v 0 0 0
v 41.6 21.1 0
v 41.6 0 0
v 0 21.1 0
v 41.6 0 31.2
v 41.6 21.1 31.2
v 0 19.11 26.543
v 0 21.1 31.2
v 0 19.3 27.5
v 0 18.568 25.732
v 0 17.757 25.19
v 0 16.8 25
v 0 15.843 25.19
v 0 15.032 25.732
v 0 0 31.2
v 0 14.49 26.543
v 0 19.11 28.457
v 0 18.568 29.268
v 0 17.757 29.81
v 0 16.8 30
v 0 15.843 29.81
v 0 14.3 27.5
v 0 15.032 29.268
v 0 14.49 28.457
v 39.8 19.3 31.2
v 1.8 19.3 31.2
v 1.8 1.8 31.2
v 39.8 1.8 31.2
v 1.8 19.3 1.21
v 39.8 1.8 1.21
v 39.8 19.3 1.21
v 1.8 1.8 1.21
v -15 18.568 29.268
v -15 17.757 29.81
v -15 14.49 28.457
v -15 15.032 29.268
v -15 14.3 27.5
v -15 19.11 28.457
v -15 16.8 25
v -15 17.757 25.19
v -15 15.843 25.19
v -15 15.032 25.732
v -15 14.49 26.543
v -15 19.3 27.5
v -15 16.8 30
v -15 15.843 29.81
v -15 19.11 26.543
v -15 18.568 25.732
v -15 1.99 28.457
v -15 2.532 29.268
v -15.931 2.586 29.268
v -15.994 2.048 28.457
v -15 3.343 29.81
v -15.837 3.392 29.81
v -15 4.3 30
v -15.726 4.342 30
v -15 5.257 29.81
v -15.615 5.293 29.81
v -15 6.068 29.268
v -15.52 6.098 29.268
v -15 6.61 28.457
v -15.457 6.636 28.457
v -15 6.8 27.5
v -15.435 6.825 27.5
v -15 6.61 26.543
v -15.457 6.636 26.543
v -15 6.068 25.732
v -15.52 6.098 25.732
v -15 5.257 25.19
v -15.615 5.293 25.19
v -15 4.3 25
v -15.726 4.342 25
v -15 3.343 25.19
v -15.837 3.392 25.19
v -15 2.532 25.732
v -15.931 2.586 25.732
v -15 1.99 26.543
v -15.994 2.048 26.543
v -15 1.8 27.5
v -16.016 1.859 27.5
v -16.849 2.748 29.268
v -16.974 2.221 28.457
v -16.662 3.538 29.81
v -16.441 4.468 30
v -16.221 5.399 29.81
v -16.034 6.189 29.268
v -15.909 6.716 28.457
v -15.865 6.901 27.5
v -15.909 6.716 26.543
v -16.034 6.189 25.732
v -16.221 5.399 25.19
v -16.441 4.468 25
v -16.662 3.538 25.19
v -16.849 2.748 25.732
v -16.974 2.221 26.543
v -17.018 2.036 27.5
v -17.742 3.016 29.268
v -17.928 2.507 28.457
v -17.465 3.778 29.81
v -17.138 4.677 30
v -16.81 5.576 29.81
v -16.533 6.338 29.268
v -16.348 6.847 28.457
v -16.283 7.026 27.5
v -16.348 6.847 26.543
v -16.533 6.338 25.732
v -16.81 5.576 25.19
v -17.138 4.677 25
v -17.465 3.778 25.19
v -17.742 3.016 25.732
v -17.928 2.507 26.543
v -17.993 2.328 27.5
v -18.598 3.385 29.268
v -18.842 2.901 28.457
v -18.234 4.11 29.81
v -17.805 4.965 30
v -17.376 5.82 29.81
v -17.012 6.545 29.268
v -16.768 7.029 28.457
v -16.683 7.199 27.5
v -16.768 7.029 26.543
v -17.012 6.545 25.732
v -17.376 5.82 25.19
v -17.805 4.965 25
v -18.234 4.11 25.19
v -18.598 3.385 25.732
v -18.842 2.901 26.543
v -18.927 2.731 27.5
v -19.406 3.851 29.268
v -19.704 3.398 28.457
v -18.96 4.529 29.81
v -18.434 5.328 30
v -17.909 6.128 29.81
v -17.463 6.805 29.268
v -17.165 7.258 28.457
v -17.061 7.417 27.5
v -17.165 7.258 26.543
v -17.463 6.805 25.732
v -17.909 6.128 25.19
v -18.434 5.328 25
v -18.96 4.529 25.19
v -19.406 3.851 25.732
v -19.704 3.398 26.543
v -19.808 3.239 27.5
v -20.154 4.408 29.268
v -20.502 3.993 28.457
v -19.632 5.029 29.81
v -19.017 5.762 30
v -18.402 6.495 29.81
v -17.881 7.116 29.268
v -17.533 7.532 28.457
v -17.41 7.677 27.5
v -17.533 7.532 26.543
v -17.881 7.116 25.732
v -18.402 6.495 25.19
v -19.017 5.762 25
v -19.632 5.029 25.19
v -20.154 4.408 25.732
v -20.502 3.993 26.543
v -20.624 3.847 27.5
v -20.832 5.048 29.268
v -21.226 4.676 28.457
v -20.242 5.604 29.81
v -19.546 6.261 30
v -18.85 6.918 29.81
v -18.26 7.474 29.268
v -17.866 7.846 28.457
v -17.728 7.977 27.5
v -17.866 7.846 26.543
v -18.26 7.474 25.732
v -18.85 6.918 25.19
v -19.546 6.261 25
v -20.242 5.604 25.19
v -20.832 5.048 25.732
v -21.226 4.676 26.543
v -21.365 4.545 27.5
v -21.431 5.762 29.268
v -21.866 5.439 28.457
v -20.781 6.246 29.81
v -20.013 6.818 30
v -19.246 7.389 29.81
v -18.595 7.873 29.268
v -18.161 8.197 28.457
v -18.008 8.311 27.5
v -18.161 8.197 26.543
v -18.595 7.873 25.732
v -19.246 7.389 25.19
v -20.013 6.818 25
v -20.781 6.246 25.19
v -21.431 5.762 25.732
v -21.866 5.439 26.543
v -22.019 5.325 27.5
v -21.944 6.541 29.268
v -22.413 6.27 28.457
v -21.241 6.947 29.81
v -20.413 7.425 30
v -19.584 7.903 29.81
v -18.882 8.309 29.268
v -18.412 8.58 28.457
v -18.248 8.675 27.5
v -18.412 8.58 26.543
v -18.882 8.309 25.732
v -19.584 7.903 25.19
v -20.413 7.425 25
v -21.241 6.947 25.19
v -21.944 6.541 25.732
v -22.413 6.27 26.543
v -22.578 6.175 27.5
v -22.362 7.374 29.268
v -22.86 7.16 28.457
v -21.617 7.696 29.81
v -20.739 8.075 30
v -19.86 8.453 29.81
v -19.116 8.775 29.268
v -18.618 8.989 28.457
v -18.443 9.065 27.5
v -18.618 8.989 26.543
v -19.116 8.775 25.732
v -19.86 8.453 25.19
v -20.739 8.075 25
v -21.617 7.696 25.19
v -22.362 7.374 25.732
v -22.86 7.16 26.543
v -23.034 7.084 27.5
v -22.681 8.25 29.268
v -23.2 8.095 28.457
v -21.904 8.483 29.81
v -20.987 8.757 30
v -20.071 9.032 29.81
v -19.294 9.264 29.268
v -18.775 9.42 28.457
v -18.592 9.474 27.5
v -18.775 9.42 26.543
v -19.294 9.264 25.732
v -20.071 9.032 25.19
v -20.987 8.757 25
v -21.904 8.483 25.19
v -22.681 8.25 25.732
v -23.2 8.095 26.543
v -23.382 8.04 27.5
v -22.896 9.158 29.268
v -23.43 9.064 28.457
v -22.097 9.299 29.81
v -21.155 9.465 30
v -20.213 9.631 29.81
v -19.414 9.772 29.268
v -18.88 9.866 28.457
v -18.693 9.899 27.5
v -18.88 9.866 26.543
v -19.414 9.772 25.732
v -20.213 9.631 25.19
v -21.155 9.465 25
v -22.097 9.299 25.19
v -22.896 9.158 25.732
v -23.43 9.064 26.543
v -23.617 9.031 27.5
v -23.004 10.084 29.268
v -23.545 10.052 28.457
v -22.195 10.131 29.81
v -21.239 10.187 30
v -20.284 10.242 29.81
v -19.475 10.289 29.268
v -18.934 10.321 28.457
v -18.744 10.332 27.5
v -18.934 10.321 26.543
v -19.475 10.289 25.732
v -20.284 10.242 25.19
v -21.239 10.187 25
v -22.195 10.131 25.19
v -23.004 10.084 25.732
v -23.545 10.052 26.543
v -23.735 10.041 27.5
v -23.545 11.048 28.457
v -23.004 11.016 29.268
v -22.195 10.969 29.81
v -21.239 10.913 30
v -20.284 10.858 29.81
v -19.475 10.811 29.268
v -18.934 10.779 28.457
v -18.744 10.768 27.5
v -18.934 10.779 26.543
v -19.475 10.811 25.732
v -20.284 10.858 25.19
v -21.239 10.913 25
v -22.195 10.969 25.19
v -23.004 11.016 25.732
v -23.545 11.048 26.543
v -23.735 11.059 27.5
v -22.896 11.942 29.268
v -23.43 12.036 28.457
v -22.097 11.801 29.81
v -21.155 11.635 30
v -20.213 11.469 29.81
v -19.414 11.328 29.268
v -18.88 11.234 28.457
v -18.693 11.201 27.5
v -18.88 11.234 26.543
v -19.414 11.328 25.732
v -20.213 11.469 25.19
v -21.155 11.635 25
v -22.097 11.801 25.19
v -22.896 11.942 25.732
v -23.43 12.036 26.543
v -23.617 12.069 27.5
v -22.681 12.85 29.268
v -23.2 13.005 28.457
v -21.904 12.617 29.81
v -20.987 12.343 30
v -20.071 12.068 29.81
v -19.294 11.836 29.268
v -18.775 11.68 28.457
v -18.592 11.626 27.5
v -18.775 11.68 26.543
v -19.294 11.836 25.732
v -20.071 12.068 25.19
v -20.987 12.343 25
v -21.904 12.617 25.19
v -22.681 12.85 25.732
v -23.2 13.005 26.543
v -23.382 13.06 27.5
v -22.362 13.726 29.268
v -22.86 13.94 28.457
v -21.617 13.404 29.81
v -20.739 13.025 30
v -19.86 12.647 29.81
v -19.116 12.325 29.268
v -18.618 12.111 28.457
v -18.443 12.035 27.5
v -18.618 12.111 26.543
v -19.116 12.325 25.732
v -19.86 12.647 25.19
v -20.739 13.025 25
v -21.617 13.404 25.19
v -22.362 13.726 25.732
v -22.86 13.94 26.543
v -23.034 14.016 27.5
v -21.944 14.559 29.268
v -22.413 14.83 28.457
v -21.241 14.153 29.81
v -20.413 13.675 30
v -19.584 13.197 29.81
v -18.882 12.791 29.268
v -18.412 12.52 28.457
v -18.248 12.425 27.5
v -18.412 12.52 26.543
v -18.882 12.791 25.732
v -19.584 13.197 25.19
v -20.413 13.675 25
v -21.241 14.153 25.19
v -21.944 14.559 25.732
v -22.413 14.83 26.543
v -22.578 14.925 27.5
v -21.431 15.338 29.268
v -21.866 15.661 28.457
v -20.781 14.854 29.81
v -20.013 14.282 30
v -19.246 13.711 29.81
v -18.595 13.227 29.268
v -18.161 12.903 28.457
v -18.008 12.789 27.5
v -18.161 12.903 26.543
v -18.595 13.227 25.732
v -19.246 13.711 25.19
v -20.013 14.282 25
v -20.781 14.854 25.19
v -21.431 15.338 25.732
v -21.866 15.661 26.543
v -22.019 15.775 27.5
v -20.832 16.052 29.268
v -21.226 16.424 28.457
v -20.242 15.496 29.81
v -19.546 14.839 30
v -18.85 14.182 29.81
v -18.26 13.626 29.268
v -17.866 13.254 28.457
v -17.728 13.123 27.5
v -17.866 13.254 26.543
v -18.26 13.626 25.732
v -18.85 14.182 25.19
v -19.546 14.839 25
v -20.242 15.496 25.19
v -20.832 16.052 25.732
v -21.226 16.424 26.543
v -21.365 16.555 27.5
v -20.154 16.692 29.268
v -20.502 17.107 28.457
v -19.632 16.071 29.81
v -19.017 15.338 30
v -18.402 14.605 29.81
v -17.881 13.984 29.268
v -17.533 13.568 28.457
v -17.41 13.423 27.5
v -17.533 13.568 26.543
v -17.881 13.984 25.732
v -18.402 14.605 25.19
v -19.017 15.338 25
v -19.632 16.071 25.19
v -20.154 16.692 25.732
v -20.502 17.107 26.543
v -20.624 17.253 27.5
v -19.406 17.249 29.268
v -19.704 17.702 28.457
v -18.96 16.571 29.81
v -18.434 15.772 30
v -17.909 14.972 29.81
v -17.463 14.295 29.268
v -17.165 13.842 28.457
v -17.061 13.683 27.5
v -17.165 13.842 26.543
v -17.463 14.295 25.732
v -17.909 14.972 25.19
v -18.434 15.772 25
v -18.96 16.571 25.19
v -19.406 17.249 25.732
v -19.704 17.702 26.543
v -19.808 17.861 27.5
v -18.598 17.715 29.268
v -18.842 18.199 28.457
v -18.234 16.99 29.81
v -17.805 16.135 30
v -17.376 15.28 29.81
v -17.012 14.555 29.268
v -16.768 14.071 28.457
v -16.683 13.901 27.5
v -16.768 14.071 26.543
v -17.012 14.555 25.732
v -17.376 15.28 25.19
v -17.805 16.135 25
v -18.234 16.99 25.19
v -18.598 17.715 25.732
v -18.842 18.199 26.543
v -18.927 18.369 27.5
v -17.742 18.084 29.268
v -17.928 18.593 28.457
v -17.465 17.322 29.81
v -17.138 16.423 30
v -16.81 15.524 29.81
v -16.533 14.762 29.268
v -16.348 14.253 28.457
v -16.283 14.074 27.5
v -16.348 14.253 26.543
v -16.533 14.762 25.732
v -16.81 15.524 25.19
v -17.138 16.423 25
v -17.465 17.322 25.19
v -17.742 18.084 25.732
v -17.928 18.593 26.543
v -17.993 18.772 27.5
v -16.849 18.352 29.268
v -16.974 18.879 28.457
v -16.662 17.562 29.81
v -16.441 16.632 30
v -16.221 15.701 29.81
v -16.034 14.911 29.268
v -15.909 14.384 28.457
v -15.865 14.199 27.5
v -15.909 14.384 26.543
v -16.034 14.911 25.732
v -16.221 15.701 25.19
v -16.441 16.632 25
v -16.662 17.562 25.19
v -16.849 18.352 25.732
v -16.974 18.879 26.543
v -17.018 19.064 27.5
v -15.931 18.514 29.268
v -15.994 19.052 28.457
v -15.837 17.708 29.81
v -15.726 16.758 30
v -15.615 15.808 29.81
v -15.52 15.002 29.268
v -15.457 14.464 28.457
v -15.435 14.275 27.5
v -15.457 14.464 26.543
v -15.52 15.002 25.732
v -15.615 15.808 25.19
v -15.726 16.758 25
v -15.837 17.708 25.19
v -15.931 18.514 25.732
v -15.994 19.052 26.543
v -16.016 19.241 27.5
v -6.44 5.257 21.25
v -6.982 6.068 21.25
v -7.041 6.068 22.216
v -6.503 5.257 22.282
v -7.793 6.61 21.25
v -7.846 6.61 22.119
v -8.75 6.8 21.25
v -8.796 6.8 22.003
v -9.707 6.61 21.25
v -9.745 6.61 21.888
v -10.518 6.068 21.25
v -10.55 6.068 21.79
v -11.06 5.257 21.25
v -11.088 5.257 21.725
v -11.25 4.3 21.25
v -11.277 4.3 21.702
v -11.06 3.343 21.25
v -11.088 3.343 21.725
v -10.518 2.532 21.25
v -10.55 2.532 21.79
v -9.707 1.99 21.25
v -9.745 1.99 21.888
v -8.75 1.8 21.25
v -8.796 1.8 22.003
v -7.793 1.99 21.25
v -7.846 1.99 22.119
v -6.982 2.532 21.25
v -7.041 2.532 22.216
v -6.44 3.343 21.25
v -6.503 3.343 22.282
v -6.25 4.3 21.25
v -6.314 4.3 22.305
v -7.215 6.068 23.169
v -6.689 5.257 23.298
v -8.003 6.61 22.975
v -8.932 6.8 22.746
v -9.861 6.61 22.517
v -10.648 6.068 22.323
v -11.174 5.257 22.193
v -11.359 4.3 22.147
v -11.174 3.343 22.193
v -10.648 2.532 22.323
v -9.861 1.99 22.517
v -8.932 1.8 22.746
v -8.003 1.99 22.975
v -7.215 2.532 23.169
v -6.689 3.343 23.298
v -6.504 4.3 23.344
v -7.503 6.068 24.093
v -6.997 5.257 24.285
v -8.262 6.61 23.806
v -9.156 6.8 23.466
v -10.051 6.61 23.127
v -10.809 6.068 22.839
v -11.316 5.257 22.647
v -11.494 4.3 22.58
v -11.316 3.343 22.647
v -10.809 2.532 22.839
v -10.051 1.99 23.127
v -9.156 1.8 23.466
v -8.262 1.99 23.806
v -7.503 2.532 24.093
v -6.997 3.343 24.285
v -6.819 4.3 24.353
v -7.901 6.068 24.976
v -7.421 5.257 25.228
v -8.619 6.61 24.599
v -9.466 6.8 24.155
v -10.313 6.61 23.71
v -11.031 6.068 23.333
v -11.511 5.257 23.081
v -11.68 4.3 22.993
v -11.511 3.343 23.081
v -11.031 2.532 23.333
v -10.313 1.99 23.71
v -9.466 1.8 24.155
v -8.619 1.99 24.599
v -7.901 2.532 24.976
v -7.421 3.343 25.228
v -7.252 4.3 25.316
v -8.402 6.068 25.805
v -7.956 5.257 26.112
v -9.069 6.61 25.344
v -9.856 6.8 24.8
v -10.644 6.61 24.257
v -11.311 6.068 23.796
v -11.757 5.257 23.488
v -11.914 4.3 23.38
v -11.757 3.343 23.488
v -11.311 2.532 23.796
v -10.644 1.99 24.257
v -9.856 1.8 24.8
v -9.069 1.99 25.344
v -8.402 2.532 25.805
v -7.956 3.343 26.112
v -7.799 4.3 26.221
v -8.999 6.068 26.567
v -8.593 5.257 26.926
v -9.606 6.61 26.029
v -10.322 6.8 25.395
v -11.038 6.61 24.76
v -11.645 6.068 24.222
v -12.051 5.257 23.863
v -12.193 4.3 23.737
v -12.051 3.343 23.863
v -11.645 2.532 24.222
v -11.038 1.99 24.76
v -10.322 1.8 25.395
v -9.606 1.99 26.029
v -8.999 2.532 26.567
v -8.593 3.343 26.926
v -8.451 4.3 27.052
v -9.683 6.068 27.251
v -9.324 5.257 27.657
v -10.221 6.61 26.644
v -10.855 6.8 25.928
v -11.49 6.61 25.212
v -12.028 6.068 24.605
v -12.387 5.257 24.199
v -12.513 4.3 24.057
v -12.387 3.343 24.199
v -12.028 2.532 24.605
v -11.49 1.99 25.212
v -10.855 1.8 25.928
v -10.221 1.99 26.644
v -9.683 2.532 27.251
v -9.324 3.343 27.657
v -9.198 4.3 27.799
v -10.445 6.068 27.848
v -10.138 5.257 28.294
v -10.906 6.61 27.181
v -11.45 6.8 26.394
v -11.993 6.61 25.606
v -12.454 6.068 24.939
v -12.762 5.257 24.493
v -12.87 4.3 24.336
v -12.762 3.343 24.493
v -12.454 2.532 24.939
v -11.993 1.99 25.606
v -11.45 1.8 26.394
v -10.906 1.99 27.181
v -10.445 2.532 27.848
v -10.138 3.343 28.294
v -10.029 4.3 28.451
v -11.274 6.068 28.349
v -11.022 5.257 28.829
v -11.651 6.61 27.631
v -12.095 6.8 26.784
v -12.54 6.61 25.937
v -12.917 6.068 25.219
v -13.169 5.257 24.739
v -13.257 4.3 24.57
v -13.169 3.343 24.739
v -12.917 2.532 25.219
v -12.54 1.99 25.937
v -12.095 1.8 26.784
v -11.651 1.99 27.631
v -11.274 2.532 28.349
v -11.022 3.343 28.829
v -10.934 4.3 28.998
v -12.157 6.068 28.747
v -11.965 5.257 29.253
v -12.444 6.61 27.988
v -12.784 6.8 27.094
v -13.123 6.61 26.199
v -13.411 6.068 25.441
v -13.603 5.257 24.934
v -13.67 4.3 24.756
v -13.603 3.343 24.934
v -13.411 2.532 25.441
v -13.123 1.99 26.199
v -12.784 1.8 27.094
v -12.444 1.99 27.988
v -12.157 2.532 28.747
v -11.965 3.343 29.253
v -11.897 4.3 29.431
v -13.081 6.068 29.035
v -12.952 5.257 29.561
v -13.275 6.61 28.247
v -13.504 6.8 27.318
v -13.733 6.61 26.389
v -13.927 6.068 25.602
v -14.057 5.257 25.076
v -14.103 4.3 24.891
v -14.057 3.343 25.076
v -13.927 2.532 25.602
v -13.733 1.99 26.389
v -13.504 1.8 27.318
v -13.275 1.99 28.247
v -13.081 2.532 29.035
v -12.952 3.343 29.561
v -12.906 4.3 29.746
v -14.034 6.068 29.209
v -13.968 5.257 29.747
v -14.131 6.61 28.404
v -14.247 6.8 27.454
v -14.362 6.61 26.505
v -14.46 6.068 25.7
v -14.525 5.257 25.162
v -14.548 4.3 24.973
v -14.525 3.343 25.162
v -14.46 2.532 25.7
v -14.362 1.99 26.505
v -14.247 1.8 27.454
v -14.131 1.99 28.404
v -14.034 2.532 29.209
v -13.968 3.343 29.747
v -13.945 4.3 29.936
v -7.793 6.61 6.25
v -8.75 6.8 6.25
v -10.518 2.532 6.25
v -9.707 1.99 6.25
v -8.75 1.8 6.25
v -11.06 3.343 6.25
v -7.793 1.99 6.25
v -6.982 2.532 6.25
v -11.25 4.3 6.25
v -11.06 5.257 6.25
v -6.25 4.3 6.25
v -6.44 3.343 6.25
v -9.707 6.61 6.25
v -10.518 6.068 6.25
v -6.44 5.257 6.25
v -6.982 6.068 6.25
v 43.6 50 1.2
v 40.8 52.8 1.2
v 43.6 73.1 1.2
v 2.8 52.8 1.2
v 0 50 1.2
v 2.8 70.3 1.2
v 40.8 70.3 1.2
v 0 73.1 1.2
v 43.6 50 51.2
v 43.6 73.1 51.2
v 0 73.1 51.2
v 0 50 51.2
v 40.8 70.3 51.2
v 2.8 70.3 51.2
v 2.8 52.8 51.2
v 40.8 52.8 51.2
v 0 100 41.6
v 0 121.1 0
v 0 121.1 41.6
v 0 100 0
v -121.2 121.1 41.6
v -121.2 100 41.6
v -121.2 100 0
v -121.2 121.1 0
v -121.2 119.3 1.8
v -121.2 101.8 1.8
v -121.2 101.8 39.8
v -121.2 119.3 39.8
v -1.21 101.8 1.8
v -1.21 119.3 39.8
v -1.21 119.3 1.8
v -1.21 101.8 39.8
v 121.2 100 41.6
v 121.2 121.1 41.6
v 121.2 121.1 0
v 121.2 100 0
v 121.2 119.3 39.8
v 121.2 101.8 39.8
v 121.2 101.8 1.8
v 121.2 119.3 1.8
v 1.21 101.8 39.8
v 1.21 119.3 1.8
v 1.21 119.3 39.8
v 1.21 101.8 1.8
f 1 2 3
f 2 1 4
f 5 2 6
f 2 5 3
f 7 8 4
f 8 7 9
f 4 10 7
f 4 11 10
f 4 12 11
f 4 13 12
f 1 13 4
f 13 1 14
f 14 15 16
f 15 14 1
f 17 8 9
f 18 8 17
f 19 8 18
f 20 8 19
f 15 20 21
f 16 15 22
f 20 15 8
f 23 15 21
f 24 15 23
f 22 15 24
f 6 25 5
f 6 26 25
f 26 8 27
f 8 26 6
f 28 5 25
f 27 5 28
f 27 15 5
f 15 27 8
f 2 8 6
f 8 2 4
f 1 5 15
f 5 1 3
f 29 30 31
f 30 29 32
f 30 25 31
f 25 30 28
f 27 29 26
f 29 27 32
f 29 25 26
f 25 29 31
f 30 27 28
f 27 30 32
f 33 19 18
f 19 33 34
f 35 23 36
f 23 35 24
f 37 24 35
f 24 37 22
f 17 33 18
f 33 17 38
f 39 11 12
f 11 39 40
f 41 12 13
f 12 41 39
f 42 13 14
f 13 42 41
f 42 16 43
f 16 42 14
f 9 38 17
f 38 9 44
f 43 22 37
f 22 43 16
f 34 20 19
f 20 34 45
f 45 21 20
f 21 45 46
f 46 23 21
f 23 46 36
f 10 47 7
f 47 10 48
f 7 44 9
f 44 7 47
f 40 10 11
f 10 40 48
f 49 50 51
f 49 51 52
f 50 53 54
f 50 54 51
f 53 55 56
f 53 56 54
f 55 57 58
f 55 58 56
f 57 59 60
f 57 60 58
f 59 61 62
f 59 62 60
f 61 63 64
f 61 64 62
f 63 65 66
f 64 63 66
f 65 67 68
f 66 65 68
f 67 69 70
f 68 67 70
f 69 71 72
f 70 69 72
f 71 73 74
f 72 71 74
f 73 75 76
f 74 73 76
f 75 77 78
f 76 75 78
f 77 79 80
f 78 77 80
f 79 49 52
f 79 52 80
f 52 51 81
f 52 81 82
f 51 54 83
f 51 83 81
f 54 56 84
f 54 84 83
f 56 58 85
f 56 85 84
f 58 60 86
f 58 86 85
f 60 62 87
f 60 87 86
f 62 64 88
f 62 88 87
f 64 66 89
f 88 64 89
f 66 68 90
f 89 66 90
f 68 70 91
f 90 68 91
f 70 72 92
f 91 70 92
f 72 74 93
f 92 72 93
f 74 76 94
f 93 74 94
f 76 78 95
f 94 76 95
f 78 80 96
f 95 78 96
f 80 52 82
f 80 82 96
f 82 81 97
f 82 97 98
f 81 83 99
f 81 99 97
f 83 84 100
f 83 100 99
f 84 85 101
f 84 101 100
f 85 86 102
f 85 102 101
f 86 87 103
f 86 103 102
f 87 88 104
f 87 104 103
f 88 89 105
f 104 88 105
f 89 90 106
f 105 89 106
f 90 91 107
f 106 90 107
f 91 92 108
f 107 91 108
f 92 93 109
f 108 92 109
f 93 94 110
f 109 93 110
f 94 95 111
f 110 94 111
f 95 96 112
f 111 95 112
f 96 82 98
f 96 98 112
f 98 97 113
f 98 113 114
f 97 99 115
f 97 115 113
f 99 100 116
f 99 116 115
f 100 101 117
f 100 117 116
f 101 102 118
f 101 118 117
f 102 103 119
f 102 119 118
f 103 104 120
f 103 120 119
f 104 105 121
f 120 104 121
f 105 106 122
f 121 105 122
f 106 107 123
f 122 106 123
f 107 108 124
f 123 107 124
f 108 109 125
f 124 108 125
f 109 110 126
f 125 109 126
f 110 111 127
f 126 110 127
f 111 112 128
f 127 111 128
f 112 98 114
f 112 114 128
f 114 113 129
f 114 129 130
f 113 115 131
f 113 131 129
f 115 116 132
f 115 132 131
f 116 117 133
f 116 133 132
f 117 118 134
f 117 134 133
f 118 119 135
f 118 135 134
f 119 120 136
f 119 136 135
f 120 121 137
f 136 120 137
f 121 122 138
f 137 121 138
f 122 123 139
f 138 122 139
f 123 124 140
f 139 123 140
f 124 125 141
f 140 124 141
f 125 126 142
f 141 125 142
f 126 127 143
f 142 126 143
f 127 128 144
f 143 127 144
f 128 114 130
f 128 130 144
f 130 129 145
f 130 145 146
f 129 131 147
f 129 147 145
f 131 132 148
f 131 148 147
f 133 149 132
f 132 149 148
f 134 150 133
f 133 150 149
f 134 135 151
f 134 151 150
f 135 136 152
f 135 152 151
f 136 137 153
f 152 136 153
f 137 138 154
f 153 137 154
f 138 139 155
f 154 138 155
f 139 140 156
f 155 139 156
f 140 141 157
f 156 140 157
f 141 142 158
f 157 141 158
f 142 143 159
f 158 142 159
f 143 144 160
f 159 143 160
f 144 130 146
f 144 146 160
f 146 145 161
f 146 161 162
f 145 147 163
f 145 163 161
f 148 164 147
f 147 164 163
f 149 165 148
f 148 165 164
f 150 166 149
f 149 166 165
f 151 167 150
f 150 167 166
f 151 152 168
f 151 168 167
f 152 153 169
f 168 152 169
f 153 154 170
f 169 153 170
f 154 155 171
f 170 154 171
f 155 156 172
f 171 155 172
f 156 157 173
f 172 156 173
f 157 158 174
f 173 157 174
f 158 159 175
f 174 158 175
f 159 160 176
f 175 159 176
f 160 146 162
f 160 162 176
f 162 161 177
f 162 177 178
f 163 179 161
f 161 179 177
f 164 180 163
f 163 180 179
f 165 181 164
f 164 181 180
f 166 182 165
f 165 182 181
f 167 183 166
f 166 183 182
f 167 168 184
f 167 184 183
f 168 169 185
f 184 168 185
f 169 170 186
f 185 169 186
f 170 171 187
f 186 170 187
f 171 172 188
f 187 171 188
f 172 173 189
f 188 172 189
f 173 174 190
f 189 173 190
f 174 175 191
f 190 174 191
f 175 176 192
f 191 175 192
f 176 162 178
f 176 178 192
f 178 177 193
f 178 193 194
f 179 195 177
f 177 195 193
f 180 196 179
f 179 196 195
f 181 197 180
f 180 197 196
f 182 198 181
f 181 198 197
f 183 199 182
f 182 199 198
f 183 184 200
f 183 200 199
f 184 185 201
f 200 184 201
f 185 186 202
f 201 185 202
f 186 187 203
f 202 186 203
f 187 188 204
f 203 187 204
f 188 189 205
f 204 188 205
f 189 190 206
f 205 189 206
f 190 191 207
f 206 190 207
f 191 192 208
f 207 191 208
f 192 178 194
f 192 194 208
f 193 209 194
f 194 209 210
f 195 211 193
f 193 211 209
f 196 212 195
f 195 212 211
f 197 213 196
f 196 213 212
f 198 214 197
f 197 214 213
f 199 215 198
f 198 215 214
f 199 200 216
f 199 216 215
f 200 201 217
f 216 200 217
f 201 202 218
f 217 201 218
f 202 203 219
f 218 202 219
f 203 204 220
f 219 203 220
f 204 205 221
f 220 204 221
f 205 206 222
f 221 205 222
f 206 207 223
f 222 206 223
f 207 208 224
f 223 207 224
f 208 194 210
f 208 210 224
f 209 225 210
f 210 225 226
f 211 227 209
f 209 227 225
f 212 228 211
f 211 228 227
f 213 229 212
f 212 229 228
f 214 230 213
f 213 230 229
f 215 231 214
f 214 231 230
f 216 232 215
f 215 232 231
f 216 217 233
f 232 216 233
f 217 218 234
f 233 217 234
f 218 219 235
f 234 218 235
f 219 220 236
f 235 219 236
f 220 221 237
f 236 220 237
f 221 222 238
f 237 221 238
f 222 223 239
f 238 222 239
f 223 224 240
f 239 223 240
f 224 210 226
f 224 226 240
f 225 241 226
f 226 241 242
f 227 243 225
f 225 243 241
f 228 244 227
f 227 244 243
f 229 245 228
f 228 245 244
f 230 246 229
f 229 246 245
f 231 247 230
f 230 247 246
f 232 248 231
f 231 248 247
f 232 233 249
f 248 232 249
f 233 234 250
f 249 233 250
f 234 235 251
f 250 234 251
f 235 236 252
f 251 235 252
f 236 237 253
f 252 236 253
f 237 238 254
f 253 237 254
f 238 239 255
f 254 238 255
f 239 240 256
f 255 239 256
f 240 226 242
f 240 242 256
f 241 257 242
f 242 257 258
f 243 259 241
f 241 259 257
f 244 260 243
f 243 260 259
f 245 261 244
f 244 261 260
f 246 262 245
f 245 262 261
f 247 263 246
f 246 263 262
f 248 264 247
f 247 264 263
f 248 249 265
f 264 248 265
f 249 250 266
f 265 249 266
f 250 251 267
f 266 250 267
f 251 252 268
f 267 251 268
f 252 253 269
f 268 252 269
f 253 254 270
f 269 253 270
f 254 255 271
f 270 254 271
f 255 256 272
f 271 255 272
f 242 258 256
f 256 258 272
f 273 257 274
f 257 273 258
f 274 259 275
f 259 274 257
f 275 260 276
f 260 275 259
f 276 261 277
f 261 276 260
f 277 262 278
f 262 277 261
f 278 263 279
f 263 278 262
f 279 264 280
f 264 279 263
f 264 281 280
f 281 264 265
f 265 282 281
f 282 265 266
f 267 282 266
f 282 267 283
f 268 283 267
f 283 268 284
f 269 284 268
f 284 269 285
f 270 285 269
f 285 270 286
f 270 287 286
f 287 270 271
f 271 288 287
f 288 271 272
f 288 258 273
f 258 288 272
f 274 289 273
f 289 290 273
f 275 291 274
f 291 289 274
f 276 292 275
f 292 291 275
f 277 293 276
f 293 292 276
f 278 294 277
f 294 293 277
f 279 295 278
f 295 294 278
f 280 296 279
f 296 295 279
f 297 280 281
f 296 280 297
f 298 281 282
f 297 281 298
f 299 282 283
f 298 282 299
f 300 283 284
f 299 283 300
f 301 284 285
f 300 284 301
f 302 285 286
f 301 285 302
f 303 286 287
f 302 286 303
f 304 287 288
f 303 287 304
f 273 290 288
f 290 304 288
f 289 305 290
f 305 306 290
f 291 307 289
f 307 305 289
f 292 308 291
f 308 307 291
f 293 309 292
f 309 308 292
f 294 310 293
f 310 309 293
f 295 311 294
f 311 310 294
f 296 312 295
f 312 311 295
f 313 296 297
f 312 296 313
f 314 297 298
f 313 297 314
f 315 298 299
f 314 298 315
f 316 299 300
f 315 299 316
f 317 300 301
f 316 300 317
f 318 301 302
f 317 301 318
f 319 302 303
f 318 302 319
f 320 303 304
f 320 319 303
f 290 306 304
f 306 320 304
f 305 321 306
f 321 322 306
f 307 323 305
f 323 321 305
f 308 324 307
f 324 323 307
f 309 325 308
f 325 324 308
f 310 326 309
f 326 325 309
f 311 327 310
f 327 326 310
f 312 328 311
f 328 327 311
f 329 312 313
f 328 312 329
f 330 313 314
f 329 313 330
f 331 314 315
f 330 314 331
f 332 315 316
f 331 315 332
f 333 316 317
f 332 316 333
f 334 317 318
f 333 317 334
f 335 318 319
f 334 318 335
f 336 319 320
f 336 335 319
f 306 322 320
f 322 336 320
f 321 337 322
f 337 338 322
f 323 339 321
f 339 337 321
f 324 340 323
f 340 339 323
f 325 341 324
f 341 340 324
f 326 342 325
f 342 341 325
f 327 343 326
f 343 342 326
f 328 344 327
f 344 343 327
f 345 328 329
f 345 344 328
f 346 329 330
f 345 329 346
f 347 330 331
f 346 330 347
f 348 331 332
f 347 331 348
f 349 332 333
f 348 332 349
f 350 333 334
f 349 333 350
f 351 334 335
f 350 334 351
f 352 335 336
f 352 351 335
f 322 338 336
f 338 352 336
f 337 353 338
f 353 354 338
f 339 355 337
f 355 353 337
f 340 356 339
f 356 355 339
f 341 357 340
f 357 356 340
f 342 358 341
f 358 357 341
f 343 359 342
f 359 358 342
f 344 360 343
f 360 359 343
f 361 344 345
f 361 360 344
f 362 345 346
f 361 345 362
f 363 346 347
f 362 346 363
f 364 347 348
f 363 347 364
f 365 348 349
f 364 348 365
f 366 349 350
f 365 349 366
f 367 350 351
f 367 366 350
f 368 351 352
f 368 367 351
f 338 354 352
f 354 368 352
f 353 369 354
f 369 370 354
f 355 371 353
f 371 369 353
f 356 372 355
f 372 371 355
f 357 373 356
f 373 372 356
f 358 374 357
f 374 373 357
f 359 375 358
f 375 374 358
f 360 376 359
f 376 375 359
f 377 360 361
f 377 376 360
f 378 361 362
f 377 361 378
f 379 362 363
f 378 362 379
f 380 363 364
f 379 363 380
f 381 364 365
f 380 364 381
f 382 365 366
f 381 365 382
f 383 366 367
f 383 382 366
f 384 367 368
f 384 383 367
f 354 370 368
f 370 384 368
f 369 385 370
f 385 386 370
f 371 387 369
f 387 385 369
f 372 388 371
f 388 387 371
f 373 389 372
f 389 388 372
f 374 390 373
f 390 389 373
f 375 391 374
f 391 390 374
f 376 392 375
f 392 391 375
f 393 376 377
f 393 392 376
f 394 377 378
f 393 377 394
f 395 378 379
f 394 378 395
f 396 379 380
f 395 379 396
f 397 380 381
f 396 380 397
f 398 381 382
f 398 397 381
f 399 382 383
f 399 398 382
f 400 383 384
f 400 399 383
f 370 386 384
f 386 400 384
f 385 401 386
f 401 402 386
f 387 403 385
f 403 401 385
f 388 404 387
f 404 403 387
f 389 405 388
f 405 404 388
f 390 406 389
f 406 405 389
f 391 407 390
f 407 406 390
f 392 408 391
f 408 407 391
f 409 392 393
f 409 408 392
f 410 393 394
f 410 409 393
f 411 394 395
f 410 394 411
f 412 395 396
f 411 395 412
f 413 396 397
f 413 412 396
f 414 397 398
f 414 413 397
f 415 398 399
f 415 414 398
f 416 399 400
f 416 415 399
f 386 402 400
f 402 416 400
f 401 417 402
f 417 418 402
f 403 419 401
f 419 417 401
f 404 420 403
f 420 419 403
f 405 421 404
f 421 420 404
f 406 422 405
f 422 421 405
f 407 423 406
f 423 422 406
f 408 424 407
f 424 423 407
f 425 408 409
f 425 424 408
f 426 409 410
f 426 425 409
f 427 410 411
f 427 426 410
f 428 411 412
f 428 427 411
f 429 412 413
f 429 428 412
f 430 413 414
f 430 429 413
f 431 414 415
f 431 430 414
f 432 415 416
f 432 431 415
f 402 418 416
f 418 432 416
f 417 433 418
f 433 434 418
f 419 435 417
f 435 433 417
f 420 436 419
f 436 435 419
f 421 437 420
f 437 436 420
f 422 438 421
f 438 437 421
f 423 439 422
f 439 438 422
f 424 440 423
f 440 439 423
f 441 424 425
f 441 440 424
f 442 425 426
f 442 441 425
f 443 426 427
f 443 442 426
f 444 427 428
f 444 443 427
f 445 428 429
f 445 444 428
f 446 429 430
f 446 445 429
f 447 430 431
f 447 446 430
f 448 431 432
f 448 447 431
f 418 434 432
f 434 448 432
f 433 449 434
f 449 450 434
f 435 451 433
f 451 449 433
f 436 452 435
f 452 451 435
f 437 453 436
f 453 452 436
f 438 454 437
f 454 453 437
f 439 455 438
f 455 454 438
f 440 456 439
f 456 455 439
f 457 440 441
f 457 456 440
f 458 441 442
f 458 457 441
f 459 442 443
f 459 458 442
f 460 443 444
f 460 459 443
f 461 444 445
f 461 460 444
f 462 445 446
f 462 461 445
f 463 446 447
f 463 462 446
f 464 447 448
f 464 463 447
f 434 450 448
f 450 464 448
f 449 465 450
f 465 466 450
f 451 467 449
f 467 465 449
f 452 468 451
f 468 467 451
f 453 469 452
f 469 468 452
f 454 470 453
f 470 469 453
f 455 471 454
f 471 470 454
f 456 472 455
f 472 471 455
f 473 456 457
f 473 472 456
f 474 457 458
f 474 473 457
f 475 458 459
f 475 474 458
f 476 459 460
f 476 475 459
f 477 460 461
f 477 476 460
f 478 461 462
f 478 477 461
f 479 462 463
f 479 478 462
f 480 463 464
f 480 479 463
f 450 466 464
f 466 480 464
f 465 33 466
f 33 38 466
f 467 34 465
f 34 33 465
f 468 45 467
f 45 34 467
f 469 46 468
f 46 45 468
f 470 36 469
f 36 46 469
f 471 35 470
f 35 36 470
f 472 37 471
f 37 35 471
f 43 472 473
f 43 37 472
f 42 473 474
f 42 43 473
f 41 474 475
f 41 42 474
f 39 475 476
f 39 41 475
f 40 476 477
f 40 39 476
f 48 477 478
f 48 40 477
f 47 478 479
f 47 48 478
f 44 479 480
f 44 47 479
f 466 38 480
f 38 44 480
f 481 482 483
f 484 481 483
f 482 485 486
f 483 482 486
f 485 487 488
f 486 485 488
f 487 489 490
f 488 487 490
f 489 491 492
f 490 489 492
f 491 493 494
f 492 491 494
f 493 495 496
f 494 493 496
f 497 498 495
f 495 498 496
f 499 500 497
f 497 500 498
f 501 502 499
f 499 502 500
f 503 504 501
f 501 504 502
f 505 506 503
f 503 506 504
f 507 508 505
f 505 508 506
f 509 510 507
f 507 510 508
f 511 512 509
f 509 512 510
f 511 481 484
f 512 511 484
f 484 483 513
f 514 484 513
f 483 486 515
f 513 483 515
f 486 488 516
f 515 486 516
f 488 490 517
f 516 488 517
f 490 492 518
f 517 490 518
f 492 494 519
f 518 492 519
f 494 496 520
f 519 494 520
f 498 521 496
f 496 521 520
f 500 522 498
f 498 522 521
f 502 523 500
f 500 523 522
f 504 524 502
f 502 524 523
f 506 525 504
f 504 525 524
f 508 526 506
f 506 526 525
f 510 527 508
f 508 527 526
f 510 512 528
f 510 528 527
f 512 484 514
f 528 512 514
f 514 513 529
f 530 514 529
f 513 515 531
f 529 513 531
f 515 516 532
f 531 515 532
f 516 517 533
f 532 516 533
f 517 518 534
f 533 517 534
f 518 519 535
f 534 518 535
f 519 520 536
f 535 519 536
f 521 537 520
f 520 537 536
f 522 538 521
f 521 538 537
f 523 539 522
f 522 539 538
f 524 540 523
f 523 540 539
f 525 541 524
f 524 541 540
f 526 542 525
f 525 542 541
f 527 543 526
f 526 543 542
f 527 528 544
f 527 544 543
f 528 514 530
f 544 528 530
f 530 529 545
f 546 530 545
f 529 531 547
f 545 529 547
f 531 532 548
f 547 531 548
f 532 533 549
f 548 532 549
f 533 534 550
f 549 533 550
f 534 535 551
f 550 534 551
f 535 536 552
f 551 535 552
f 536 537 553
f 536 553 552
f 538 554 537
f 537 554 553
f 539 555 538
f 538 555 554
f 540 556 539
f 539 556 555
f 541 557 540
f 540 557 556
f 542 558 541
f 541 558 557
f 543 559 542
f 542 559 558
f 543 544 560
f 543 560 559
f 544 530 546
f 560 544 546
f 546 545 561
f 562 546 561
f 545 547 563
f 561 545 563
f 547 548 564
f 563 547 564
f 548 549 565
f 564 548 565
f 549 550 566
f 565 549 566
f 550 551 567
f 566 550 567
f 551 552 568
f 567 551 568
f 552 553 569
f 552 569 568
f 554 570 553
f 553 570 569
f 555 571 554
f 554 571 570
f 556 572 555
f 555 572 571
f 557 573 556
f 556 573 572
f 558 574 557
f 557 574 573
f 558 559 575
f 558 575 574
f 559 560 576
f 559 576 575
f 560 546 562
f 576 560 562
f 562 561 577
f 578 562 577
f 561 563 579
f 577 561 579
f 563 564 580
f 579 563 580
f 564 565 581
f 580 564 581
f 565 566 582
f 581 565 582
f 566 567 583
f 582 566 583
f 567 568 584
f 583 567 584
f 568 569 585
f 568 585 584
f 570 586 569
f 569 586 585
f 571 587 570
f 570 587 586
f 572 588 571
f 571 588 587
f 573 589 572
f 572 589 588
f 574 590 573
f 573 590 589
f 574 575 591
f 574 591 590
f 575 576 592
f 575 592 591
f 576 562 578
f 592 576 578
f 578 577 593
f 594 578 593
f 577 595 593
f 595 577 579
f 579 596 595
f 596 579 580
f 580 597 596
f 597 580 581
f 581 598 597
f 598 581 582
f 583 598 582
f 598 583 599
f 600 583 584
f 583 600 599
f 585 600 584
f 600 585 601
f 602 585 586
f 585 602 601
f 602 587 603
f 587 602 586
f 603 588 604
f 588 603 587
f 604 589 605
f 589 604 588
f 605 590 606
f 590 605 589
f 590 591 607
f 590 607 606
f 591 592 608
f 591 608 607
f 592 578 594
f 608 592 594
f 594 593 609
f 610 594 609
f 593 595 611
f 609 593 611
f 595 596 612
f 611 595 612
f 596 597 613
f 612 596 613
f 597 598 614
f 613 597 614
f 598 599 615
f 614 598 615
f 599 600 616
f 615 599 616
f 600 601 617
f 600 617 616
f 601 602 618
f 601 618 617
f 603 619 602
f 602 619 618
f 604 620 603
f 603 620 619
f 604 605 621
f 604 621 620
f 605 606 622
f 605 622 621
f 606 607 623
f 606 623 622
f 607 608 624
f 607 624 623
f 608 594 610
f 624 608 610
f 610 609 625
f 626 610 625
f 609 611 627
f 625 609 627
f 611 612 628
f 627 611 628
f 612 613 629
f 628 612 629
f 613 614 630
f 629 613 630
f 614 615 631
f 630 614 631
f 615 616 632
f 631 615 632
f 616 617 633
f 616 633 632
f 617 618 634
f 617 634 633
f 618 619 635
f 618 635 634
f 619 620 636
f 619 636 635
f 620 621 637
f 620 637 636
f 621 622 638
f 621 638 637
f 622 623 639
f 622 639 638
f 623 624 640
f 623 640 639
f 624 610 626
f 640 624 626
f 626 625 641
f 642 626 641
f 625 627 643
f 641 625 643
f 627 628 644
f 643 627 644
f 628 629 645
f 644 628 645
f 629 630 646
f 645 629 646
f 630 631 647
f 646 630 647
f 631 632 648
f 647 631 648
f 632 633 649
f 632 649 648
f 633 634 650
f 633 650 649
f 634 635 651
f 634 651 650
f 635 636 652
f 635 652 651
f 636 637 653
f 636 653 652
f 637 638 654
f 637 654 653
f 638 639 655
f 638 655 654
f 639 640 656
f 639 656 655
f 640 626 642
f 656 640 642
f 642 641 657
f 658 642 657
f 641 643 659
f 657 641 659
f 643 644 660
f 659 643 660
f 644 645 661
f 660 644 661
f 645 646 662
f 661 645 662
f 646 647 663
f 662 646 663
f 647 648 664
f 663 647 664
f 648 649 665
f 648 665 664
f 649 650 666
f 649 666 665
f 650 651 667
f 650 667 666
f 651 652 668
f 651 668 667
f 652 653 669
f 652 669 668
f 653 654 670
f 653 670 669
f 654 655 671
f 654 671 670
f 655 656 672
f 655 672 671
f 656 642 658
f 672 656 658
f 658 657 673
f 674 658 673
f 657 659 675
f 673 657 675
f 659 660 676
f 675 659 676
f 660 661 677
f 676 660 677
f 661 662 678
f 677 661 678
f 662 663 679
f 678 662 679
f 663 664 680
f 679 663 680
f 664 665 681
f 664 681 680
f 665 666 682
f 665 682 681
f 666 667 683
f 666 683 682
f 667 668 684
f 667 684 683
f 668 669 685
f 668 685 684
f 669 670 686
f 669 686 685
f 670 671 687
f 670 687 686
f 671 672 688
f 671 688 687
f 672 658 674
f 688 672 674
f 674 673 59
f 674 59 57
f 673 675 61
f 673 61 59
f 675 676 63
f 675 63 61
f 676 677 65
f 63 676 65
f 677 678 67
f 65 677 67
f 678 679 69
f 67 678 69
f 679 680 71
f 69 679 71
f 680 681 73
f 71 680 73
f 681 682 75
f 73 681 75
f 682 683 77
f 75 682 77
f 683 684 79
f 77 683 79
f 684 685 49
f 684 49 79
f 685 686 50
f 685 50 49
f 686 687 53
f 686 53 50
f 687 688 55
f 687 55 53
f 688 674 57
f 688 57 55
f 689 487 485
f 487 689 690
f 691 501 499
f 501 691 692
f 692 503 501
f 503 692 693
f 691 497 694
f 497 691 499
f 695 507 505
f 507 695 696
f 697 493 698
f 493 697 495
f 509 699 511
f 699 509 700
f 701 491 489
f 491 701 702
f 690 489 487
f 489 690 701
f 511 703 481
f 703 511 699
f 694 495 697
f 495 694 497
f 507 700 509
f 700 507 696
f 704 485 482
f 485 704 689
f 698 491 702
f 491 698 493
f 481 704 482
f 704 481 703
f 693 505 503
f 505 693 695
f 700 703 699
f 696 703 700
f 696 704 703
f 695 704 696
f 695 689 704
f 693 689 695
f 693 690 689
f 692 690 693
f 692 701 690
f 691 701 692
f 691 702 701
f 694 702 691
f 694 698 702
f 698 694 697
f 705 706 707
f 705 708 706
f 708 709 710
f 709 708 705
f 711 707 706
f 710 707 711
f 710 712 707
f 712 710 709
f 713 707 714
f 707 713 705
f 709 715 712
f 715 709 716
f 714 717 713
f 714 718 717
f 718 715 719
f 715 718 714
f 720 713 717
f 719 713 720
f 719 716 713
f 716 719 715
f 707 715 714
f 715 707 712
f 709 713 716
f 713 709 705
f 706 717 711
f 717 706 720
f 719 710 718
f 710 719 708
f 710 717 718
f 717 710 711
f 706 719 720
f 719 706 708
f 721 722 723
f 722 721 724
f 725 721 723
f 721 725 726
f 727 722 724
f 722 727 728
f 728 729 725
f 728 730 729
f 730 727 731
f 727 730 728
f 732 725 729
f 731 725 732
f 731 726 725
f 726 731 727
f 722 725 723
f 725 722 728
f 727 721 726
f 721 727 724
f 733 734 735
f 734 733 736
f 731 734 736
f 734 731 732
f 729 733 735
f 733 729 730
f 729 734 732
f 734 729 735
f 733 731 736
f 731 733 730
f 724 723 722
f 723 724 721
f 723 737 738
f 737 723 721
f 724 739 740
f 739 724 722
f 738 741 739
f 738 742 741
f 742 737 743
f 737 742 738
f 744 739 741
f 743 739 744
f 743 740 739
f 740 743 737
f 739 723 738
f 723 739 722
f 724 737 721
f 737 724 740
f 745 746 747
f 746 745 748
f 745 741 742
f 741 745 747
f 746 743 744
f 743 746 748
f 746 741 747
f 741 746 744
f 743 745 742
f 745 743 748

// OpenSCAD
// -*- mode: SCAD ; c-file-style: "ellemtel" ; coding: utf-8 -*-
//
// NN
//
// © 2018–2019 Roland Sieker <ospalh@gmail.com>
// Licence: CC-BY-SA 4.0

/* [Global] */

// … to preview. You will get all parts as separate STLs when you click “Create Thing”.
part = "s"; // [s: Set, h: Haken, d: Doppelhaken, v: Verbinder, t: Test]

// Set this to “render” and click on “Create Thing” when done with the setup.
preview = 1; // [0:render, 1:preview]

/* [Sizes] */

// Tieve
size_x = 17.5;  // [1:0.25:40]

// Breite
size_y = 38;  // [1:0.25:70]

/* [Hidden] */

r_h = 2.5;
ast = 10;
// r_i = 1;

l_dhk = 50;
l_hk = 30;
l_vb1 = 120;

r_k = size_x/2 - r_h;
ast_e = ast +  2*r_h;

// Done with the customizer

// *******************************************************
// Extra parameters. These can be changed reasonably safely.


w = 1.8;  // Wall width
p = 1.2;  // Bottom, top plate hight
c = 0.4;  // Clearance
angle = 60; // Overhangs much below 60° are a problem for me

// *******************************************************
// Some shortcuts. These shouldn’t be changed


module kmirror(maxis=[1, 0, 0])
{
   // Keep *and* mirror an object. Standard is left and right mirroring.
   children();
   mirror(maxis)
   {
      children();
   }
}

tau = 2 * PI;  // π is still wrong. τ = circumference / r

xy_factor = 1/tan(angle);
// To get from a hight to a horizontal width inclined correctly
z_factor = tan(angle);  // The other way around


some_distance = 50;
ms = 0.01;  // Muggeseggele.

// fn for differently sized objects and fs, fa; all for preview or rendering.
pna = 40;
pnb = 15;
pa = 5;
ps = 1;
rna = 180;
rnb = 30;
ra = 2;
rs = 0.25;
function na() = (preview) ? pna : rna;
function nb() = (preview) ? pnb : rnb;
$fs = (preview) ? ps : rs;
$fa = (preview) ? pa : ra;

// *******************************************************
// End setup



// *******************************************************
// Generate the parts

print_part();


if ("s" == part)
{
   preview_parts();
}

if (part == "t")
{
   nur_haken();
}

if ("st" == part)
{
   // Use "st" during development
   stack_parts();
}

module print_part()
{
   if ("h" == part)
   {
      haken();
   }
   if ("d" == part)
   {
      doppelhaken();
   }
   if ("v" == part)
   {
      verbinder();
   }
}

module preview_parts()
{
   haken();
   translate([0, some_distance, 0])
   {
      doppelhaken();
   }
   translate([0, 2*some_distance, 0])
   {
      verbinder();
   }
}

module stack_parts()
{
   // intersection()
   {
      color("yellow")
      {
         haken();
      }
      translate([0,0,30])
      {
         color("red")
         {
            doppelhaken();
         }
      }
   }
}

// *******************************************************
// Code for the parts themselves





module haken()
{
   rotate([0,90,0])
   translate([-l_hk-p,0,0])
   frame(l_hk, true);
   translate([0,size_x-r_h+w,-r_h+l_hk])
   rotate([90,0,-90])
   nur_haken();
}

module doppelhaken()
{
   rotate([0,90,0])
      translate([-l_dhk-p,0,0])
      frame(l_dhk, false);
}

module verbinder()
{
   kmirror()
      translate([-l_vb1-p, 0, 0])
      frame(l_vb1, true);
}


module frame(l, ep)
{
   le = l + (ep ? p : 0);
   lh = l + (ep ? 0 : 30);
   ext = ep ? 0 : 1;
   difference()
   {
      cube([le, size_x+2*w+2*ext, size_y+2*w+2*ext]);
      translate([-ms, w+ext, w+ext])
         cube([lh, size_x, size_y]);
      }
}

module nur_haken()
{
   cylinder(r=r_h, h=ast_e);
   translate([r_k,0,ast_e])
      rotate([90,0,0])
      rotate_extrude(angle=180)
      translate([r_k, 0])
      circle(r=r_h);
   translate([2*r_k,-r_k,ast_e])
      rotate([0,90,0])
      rotate_extrude(angle=90)
      translate([r_k, 0])
      circle(r=r_h);
   translate([2*r_k,-r_k,ast_e-r_k])
      rotate([90,0,0])
      cylinder(r=r_h, h=ast_e);
}
